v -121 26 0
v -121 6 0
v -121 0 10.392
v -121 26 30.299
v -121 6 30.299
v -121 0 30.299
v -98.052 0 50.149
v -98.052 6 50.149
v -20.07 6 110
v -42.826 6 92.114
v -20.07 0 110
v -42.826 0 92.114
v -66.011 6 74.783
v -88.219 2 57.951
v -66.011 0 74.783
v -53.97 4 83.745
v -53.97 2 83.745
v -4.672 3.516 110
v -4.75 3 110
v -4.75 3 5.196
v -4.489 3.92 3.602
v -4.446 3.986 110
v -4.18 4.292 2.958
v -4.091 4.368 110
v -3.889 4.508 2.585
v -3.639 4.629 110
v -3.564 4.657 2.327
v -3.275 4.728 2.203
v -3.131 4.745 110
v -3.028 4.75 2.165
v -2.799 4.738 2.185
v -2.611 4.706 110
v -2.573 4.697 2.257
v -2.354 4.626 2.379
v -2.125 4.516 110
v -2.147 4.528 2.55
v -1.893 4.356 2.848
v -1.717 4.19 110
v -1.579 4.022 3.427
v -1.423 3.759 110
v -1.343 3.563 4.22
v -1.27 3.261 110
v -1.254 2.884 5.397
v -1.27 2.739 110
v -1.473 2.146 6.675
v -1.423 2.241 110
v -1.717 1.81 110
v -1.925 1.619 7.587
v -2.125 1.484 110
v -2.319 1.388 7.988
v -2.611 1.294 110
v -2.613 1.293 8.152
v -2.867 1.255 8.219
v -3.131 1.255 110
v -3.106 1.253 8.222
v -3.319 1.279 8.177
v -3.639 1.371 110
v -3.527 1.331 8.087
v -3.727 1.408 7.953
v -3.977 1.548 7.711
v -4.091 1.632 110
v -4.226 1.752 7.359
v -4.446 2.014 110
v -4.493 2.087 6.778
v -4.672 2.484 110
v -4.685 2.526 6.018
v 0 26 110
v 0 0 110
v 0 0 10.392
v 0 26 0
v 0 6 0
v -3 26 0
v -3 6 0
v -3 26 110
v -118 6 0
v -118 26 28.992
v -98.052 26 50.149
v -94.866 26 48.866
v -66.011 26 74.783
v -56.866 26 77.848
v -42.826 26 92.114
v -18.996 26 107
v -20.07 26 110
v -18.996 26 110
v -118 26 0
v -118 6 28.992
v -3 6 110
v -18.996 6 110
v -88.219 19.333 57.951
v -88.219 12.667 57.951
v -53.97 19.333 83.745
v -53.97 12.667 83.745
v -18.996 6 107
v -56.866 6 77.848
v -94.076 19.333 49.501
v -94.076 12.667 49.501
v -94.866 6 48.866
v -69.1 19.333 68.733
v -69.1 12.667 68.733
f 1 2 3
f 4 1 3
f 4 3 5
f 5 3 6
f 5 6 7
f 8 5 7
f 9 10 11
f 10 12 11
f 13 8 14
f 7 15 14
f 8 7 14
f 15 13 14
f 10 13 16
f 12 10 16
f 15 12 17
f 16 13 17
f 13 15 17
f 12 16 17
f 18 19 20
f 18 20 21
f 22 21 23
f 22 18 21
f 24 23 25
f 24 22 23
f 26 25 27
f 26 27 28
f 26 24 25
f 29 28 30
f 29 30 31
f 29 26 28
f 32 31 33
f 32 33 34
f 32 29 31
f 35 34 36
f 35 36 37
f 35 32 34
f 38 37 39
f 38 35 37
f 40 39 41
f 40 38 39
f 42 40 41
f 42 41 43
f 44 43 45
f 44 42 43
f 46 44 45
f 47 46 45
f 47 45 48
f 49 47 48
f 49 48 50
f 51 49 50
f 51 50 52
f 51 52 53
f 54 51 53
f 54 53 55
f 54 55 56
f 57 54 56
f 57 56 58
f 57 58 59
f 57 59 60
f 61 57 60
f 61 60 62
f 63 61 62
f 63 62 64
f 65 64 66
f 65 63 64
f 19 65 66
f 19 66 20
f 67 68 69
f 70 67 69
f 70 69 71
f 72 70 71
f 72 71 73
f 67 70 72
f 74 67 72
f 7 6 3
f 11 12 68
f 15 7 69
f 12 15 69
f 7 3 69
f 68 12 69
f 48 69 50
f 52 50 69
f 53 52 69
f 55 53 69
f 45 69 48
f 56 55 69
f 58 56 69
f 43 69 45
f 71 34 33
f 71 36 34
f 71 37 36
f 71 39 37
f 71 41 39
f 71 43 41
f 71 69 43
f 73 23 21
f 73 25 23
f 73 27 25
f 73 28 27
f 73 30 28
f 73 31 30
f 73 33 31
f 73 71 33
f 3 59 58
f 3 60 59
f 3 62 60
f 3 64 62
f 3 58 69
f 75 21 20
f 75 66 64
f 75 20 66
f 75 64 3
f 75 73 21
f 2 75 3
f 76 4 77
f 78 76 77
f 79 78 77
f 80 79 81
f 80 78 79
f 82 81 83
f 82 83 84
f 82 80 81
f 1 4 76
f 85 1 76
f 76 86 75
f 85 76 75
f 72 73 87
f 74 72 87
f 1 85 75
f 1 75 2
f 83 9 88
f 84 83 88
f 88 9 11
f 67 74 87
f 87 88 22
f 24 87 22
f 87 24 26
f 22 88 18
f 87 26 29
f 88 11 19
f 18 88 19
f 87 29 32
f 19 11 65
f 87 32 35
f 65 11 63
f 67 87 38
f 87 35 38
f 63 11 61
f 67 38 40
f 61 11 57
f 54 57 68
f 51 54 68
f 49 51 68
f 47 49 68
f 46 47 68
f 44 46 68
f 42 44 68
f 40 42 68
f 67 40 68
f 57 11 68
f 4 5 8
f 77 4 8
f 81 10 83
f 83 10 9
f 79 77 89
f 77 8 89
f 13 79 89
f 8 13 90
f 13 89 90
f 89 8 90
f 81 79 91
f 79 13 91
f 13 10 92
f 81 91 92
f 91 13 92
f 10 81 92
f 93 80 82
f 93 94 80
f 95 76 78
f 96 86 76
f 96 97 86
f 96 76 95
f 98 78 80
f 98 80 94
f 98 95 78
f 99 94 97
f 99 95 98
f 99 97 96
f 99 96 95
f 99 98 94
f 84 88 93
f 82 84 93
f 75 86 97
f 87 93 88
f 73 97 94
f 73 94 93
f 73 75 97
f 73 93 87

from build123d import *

# Parameters (mm, degrees)
BOSS_EXTRUDE1_DEPTH     = 6
CUT_EXTRUDE1_DEPTH      = 164.636793074
CUT_EXTRUDE1_DEPTH_BACK = 164.636793074
SKETCH2_R               = 1.75
BOSS_EXTRUDE2_DEPTH     = 20
SKETCH4_W               = 132.33663358
SKETCH4_H               = 54.683142632
CUT_EXTRUDE2_DEPTH      = 20


with BuildPart() as part:
    # Sketch1 → Boss-Extrude1 (new body)
    with BuildSketch(Plane(origin=(0, 0, 0), x_dir=(1, 0, 0), z_dir=(0, 1, 0))):
        with BuildLine():
            Line((0, 0), (-121, 0))
            Line((-121, 0), (-121, -30.298554482))
            add(Edge.make_bspline(
                [(-121, -30.298554482), (-89.558533356, -59.655086777), (-53.189409509, -82.739680225), (-20.07, -110)],
                knots=[0, 0, 0, 0, 1, 1, 1, 1], degree=3))
            Line((-20.07, -110), (0, -110))
            Line((0, -110), (0, 0))
        make_face()
    extrude(amount=BOSS_EXTRUDE1_DEPTH)

    # Sketch2 → Cut-Extrude1 (cut, two sides: drawn at the far end of the back side and taken through both)
    with BuildSketch(Plane(origin=(0, 0, 0), x_dir=(-1, 0, 0), z_dir=(0, 0, -1)).offset(-CUT_EXTRUDE1_DEPTH_BACK)):
        with Locations((3, 3)):
            Circle(SKETCH2_R)
    extrude(amount=CUT_EXTRUDE1_DEPTH + CUT_EXTRUDE1_DEPTH_BACK, mode=Mode.SUBTRACT)

    # Sketch3 → Boss-Extrude2 (add)
    with BuildSketch(Plane(origin=(0, 6, 0), x_dir=(1, 0, 0), z_dir=(0, 1, 0))):
        with BuildLine():
            Line((-118, -3), (-118, 0))
            Line((-118, 0), (-121, 0))
            Line((-121, 0), (-121, -30.298554482))
            add(Edge.make_bspline(
                [(-121, -30.298554482), (-89.558533356, -59.655086777), (-53.189409509, -82.739680225), (-20.07, -110)],
                knots=[0, 0, 0, 0, 1, 1, 1, 1], degree=3))
            Line((-20.07, -110), (-18.995872781, -110))
            Line((-18.995872781, -110), (-18.995872781, -107))
            add(Edge.make_bspline(
                [(-118, -28.991909602), (-110.289824181, -36.137206416), (-102.272955066, -42.924098905), (-85.87961507, -56.077650281), (-77.513636875, -62.436539609), (-52.27420649, -81.325206417), (-35.258396574, -93.669770918), (-18.995872781, -107)],
                knots=[0, 0, 0, 0, 0.25, 0.25, 0.5, 0.5, 1, 1, 1, 1], degree=3))
            Line((-118, -28.991909602), (-118, -3))
        make_face()
        Polygon((-3, -3), (-3, 0), (0, 0), (0, -110), (-3, -110), (-3, -107), align=None)
    extrude(amount=BOSS_EXTRUDE2_DEPTH)

    # Sketch4 → Cut-Extrude2 (cut)
    with BuildSketch(Plane(origin=(0, 4.5, 2.598076211), x_dir=(-1, 0, 0), z_dir=(0, -0.8660254037844398, -0.499999999999998))):
        with Locations((60.84284102, -6.354682021)):
            Rectangle(SKETCH4_W, SKETCH4_H)
    extrude(amount=CUT_EXTRUDE2_DEPTH, mode=Mode.SUBTRACT)


solid = part.part
